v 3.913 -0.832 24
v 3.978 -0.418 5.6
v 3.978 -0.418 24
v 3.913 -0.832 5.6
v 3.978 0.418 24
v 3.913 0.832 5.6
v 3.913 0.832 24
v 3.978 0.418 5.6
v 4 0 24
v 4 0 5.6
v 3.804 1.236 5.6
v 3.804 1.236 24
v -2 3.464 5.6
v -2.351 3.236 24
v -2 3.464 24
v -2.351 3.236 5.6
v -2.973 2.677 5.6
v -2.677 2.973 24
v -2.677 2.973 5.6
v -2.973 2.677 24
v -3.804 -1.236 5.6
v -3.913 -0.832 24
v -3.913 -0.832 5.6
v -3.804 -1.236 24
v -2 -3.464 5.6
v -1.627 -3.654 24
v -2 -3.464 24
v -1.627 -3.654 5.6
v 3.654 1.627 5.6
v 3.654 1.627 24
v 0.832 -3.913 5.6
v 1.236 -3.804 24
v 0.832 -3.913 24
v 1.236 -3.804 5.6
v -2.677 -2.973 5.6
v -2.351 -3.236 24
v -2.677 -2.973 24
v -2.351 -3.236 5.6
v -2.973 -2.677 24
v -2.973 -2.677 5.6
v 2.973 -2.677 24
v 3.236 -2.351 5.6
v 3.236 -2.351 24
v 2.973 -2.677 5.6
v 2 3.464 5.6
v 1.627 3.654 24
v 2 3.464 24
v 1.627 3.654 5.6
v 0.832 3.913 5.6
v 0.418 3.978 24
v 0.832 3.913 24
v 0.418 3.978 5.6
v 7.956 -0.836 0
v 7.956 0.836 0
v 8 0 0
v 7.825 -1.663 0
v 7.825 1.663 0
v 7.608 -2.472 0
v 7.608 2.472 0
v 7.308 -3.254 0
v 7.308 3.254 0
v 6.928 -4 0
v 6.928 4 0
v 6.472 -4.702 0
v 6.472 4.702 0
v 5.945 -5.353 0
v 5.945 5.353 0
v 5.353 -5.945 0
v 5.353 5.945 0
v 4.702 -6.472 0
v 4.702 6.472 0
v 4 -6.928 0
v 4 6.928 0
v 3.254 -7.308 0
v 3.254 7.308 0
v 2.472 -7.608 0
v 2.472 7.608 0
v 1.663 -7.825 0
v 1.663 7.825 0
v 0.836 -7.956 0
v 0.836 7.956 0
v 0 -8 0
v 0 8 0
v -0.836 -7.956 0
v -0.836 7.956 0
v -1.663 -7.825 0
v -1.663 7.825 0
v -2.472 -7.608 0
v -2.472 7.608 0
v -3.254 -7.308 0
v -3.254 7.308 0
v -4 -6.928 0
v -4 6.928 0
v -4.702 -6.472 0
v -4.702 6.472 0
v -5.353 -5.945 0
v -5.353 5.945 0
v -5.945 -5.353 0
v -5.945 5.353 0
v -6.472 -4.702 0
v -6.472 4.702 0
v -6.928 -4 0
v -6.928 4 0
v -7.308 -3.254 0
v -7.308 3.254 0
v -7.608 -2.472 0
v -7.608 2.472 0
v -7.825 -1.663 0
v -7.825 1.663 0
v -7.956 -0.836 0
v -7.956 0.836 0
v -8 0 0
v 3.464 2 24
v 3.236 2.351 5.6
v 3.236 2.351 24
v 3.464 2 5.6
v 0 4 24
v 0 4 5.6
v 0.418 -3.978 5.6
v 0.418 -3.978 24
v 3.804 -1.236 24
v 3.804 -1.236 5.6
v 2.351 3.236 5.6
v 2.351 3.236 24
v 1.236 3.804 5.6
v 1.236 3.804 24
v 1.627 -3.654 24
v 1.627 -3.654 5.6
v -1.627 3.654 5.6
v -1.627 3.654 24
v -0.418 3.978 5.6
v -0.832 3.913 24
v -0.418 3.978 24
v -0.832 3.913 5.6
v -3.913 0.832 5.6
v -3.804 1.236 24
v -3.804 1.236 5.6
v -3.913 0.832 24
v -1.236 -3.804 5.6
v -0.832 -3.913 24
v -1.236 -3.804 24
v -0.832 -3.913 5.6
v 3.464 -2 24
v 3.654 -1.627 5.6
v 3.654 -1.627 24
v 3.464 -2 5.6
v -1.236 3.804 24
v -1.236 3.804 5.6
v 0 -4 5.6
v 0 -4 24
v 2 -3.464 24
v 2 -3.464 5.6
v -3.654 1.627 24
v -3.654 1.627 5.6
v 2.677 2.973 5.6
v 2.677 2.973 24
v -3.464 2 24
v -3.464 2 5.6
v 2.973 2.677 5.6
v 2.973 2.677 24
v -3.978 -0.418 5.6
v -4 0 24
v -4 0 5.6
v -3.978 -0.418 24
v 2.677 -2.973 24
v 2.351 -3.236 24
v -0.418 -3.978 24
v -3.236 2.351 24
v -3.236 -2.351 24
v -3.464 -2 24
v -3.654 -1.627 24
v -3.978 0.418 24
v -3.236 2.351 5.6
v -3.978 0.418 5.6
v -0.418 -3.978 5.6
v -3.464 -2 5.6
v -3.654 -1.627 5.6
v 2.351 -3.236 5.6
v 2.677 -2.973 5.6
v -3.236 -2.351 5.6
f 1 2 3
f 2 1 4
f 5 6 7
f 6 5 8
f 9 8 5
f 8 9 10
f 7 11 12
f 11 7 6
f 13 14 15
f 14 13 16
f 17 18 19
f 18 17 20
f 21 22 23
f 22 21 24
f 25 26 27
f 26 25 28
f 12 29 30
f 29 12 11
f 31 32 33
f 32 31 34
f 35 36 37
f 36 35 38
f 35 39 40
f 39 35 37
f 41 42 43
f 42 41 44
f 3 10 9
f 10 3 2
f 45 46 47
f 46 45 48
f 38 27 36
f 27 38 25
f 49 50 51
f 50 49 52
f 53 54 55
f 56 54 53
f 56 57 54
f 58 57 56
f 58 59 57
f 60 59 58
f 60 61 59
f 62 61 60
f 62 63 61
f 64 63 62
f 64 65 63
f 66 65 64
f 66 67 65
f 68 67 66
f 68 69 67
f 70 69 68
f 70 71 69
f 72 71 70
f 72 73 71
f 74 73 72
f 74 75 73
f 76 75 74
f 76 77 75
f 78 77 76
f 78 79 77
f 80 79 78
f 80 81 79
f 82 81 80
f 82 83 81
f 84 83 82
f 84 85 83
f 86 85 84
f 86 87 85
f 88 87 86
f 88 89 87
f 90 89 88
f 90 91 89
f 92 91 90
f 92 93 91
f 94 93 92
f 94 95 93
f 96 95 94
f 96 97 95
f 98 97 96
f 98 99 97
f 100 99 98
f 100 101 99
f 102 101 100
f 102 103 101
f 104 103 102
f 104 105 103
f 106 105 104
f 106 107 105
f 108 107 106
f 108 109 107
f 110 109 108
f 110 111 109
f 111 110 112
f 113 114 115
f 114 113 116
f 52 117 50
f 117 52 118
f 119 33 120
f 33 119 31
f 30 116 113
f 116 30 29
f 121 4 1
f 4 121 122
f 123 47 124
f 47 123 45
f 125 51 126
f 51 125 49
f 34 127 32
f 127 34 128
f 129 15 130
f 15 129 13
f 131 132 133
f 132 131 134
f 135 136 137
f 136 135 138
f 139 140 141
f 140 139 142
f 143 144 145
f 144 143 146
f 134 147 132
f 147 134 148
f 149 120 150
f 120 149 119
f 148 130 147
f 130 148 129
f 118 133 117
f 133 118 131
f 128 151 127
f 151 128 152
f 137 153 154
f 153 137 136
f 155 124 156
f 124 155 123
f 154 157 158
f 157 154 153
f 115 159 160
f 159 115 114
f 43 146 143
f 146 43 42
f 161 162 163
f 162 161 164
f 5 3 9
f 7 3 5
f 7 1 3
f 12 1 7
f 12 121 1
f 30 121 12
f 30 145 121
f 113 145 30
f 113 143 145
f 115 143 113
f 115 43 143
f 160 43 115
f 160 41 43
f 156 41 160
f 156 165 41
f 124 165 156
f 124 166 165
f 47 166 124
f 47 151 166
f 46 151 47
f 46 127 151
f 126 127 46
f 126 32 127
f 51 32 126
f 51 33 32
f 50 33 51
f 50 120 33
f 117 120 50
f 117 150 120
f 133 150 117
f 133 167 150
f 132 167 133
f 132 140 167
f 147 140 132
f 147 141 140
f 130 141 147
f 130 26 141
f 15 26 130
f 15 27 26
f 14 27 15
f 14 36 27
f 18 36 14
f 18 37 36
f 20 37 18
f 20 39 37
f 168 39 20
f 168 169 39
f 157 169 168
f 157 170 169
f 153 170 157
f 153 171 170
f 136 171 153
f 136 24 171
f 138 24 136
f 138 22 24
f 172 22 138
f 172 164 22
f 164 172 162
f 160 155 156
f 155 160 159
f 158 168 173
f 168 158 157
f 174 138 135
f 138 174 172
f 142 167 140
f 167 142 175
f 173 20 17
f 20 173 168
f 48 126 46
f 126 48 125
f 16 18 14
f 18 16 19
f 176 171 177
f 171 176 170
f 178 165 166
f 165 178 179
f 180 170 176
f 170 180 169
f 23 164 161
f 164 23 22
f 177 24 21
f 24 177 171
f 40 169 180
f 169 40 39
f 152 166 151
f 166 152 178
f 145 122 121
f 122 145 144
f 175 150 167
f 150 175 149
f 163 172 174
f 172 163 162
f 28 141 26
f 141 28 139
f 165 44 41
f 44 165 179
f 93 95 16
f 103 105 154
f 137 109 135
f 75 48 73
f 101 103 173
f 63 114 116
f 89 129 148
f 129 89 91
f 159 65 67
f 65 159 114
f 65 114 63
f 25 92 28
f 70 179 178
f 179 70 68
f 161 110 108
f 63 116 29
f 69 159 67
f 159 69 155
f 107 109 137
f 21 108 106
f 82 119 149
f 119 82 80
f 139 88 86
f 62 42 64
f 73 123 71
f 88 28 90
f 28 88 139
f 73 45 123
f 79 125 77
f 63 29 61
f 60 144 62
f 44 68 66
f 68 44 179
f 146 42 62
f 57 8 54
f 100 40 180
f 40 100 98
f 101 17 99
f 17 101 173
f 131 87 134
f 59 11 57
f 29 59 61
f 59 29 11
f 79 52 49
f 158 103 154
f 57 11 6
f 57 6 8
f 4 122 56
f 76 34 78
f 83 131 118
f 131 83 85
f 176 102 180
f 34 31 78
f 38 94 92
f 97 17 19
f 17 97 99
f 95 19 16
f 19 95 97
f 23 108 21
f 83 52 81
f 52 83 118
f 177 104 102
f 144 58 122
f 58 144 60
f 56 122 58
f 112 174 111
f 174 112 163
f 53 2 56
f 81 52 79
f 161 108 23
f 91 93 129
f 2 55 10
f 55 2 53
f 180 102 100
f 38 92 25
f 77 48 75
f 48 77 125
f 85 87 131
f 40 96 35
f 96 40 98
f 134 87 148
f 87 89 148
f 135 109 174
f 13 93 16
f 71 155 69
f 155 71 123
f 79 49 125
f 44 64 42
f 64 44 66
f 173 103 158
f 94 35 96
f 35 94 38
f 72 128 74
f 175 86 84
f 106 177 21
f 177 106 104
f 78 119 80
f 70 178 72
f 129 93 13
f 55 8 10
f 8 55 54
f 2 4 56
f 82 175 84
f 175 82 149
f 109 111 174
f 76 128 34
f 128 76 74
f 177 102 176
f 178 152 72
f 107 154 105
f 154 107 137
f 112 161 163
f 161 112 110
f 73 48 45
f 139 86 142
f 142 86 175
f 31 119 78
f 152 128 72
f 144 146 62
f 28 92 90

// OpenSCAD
// Solid rivet.
$fn = 60;
eps = 0.02;
shank_d = 8;
head_d = 16;
length = 24;
union() { cylinder(d=shank_d,h=length); cylinder(d1=head_d,d2=shank_d,h=head_d*0.35); }
